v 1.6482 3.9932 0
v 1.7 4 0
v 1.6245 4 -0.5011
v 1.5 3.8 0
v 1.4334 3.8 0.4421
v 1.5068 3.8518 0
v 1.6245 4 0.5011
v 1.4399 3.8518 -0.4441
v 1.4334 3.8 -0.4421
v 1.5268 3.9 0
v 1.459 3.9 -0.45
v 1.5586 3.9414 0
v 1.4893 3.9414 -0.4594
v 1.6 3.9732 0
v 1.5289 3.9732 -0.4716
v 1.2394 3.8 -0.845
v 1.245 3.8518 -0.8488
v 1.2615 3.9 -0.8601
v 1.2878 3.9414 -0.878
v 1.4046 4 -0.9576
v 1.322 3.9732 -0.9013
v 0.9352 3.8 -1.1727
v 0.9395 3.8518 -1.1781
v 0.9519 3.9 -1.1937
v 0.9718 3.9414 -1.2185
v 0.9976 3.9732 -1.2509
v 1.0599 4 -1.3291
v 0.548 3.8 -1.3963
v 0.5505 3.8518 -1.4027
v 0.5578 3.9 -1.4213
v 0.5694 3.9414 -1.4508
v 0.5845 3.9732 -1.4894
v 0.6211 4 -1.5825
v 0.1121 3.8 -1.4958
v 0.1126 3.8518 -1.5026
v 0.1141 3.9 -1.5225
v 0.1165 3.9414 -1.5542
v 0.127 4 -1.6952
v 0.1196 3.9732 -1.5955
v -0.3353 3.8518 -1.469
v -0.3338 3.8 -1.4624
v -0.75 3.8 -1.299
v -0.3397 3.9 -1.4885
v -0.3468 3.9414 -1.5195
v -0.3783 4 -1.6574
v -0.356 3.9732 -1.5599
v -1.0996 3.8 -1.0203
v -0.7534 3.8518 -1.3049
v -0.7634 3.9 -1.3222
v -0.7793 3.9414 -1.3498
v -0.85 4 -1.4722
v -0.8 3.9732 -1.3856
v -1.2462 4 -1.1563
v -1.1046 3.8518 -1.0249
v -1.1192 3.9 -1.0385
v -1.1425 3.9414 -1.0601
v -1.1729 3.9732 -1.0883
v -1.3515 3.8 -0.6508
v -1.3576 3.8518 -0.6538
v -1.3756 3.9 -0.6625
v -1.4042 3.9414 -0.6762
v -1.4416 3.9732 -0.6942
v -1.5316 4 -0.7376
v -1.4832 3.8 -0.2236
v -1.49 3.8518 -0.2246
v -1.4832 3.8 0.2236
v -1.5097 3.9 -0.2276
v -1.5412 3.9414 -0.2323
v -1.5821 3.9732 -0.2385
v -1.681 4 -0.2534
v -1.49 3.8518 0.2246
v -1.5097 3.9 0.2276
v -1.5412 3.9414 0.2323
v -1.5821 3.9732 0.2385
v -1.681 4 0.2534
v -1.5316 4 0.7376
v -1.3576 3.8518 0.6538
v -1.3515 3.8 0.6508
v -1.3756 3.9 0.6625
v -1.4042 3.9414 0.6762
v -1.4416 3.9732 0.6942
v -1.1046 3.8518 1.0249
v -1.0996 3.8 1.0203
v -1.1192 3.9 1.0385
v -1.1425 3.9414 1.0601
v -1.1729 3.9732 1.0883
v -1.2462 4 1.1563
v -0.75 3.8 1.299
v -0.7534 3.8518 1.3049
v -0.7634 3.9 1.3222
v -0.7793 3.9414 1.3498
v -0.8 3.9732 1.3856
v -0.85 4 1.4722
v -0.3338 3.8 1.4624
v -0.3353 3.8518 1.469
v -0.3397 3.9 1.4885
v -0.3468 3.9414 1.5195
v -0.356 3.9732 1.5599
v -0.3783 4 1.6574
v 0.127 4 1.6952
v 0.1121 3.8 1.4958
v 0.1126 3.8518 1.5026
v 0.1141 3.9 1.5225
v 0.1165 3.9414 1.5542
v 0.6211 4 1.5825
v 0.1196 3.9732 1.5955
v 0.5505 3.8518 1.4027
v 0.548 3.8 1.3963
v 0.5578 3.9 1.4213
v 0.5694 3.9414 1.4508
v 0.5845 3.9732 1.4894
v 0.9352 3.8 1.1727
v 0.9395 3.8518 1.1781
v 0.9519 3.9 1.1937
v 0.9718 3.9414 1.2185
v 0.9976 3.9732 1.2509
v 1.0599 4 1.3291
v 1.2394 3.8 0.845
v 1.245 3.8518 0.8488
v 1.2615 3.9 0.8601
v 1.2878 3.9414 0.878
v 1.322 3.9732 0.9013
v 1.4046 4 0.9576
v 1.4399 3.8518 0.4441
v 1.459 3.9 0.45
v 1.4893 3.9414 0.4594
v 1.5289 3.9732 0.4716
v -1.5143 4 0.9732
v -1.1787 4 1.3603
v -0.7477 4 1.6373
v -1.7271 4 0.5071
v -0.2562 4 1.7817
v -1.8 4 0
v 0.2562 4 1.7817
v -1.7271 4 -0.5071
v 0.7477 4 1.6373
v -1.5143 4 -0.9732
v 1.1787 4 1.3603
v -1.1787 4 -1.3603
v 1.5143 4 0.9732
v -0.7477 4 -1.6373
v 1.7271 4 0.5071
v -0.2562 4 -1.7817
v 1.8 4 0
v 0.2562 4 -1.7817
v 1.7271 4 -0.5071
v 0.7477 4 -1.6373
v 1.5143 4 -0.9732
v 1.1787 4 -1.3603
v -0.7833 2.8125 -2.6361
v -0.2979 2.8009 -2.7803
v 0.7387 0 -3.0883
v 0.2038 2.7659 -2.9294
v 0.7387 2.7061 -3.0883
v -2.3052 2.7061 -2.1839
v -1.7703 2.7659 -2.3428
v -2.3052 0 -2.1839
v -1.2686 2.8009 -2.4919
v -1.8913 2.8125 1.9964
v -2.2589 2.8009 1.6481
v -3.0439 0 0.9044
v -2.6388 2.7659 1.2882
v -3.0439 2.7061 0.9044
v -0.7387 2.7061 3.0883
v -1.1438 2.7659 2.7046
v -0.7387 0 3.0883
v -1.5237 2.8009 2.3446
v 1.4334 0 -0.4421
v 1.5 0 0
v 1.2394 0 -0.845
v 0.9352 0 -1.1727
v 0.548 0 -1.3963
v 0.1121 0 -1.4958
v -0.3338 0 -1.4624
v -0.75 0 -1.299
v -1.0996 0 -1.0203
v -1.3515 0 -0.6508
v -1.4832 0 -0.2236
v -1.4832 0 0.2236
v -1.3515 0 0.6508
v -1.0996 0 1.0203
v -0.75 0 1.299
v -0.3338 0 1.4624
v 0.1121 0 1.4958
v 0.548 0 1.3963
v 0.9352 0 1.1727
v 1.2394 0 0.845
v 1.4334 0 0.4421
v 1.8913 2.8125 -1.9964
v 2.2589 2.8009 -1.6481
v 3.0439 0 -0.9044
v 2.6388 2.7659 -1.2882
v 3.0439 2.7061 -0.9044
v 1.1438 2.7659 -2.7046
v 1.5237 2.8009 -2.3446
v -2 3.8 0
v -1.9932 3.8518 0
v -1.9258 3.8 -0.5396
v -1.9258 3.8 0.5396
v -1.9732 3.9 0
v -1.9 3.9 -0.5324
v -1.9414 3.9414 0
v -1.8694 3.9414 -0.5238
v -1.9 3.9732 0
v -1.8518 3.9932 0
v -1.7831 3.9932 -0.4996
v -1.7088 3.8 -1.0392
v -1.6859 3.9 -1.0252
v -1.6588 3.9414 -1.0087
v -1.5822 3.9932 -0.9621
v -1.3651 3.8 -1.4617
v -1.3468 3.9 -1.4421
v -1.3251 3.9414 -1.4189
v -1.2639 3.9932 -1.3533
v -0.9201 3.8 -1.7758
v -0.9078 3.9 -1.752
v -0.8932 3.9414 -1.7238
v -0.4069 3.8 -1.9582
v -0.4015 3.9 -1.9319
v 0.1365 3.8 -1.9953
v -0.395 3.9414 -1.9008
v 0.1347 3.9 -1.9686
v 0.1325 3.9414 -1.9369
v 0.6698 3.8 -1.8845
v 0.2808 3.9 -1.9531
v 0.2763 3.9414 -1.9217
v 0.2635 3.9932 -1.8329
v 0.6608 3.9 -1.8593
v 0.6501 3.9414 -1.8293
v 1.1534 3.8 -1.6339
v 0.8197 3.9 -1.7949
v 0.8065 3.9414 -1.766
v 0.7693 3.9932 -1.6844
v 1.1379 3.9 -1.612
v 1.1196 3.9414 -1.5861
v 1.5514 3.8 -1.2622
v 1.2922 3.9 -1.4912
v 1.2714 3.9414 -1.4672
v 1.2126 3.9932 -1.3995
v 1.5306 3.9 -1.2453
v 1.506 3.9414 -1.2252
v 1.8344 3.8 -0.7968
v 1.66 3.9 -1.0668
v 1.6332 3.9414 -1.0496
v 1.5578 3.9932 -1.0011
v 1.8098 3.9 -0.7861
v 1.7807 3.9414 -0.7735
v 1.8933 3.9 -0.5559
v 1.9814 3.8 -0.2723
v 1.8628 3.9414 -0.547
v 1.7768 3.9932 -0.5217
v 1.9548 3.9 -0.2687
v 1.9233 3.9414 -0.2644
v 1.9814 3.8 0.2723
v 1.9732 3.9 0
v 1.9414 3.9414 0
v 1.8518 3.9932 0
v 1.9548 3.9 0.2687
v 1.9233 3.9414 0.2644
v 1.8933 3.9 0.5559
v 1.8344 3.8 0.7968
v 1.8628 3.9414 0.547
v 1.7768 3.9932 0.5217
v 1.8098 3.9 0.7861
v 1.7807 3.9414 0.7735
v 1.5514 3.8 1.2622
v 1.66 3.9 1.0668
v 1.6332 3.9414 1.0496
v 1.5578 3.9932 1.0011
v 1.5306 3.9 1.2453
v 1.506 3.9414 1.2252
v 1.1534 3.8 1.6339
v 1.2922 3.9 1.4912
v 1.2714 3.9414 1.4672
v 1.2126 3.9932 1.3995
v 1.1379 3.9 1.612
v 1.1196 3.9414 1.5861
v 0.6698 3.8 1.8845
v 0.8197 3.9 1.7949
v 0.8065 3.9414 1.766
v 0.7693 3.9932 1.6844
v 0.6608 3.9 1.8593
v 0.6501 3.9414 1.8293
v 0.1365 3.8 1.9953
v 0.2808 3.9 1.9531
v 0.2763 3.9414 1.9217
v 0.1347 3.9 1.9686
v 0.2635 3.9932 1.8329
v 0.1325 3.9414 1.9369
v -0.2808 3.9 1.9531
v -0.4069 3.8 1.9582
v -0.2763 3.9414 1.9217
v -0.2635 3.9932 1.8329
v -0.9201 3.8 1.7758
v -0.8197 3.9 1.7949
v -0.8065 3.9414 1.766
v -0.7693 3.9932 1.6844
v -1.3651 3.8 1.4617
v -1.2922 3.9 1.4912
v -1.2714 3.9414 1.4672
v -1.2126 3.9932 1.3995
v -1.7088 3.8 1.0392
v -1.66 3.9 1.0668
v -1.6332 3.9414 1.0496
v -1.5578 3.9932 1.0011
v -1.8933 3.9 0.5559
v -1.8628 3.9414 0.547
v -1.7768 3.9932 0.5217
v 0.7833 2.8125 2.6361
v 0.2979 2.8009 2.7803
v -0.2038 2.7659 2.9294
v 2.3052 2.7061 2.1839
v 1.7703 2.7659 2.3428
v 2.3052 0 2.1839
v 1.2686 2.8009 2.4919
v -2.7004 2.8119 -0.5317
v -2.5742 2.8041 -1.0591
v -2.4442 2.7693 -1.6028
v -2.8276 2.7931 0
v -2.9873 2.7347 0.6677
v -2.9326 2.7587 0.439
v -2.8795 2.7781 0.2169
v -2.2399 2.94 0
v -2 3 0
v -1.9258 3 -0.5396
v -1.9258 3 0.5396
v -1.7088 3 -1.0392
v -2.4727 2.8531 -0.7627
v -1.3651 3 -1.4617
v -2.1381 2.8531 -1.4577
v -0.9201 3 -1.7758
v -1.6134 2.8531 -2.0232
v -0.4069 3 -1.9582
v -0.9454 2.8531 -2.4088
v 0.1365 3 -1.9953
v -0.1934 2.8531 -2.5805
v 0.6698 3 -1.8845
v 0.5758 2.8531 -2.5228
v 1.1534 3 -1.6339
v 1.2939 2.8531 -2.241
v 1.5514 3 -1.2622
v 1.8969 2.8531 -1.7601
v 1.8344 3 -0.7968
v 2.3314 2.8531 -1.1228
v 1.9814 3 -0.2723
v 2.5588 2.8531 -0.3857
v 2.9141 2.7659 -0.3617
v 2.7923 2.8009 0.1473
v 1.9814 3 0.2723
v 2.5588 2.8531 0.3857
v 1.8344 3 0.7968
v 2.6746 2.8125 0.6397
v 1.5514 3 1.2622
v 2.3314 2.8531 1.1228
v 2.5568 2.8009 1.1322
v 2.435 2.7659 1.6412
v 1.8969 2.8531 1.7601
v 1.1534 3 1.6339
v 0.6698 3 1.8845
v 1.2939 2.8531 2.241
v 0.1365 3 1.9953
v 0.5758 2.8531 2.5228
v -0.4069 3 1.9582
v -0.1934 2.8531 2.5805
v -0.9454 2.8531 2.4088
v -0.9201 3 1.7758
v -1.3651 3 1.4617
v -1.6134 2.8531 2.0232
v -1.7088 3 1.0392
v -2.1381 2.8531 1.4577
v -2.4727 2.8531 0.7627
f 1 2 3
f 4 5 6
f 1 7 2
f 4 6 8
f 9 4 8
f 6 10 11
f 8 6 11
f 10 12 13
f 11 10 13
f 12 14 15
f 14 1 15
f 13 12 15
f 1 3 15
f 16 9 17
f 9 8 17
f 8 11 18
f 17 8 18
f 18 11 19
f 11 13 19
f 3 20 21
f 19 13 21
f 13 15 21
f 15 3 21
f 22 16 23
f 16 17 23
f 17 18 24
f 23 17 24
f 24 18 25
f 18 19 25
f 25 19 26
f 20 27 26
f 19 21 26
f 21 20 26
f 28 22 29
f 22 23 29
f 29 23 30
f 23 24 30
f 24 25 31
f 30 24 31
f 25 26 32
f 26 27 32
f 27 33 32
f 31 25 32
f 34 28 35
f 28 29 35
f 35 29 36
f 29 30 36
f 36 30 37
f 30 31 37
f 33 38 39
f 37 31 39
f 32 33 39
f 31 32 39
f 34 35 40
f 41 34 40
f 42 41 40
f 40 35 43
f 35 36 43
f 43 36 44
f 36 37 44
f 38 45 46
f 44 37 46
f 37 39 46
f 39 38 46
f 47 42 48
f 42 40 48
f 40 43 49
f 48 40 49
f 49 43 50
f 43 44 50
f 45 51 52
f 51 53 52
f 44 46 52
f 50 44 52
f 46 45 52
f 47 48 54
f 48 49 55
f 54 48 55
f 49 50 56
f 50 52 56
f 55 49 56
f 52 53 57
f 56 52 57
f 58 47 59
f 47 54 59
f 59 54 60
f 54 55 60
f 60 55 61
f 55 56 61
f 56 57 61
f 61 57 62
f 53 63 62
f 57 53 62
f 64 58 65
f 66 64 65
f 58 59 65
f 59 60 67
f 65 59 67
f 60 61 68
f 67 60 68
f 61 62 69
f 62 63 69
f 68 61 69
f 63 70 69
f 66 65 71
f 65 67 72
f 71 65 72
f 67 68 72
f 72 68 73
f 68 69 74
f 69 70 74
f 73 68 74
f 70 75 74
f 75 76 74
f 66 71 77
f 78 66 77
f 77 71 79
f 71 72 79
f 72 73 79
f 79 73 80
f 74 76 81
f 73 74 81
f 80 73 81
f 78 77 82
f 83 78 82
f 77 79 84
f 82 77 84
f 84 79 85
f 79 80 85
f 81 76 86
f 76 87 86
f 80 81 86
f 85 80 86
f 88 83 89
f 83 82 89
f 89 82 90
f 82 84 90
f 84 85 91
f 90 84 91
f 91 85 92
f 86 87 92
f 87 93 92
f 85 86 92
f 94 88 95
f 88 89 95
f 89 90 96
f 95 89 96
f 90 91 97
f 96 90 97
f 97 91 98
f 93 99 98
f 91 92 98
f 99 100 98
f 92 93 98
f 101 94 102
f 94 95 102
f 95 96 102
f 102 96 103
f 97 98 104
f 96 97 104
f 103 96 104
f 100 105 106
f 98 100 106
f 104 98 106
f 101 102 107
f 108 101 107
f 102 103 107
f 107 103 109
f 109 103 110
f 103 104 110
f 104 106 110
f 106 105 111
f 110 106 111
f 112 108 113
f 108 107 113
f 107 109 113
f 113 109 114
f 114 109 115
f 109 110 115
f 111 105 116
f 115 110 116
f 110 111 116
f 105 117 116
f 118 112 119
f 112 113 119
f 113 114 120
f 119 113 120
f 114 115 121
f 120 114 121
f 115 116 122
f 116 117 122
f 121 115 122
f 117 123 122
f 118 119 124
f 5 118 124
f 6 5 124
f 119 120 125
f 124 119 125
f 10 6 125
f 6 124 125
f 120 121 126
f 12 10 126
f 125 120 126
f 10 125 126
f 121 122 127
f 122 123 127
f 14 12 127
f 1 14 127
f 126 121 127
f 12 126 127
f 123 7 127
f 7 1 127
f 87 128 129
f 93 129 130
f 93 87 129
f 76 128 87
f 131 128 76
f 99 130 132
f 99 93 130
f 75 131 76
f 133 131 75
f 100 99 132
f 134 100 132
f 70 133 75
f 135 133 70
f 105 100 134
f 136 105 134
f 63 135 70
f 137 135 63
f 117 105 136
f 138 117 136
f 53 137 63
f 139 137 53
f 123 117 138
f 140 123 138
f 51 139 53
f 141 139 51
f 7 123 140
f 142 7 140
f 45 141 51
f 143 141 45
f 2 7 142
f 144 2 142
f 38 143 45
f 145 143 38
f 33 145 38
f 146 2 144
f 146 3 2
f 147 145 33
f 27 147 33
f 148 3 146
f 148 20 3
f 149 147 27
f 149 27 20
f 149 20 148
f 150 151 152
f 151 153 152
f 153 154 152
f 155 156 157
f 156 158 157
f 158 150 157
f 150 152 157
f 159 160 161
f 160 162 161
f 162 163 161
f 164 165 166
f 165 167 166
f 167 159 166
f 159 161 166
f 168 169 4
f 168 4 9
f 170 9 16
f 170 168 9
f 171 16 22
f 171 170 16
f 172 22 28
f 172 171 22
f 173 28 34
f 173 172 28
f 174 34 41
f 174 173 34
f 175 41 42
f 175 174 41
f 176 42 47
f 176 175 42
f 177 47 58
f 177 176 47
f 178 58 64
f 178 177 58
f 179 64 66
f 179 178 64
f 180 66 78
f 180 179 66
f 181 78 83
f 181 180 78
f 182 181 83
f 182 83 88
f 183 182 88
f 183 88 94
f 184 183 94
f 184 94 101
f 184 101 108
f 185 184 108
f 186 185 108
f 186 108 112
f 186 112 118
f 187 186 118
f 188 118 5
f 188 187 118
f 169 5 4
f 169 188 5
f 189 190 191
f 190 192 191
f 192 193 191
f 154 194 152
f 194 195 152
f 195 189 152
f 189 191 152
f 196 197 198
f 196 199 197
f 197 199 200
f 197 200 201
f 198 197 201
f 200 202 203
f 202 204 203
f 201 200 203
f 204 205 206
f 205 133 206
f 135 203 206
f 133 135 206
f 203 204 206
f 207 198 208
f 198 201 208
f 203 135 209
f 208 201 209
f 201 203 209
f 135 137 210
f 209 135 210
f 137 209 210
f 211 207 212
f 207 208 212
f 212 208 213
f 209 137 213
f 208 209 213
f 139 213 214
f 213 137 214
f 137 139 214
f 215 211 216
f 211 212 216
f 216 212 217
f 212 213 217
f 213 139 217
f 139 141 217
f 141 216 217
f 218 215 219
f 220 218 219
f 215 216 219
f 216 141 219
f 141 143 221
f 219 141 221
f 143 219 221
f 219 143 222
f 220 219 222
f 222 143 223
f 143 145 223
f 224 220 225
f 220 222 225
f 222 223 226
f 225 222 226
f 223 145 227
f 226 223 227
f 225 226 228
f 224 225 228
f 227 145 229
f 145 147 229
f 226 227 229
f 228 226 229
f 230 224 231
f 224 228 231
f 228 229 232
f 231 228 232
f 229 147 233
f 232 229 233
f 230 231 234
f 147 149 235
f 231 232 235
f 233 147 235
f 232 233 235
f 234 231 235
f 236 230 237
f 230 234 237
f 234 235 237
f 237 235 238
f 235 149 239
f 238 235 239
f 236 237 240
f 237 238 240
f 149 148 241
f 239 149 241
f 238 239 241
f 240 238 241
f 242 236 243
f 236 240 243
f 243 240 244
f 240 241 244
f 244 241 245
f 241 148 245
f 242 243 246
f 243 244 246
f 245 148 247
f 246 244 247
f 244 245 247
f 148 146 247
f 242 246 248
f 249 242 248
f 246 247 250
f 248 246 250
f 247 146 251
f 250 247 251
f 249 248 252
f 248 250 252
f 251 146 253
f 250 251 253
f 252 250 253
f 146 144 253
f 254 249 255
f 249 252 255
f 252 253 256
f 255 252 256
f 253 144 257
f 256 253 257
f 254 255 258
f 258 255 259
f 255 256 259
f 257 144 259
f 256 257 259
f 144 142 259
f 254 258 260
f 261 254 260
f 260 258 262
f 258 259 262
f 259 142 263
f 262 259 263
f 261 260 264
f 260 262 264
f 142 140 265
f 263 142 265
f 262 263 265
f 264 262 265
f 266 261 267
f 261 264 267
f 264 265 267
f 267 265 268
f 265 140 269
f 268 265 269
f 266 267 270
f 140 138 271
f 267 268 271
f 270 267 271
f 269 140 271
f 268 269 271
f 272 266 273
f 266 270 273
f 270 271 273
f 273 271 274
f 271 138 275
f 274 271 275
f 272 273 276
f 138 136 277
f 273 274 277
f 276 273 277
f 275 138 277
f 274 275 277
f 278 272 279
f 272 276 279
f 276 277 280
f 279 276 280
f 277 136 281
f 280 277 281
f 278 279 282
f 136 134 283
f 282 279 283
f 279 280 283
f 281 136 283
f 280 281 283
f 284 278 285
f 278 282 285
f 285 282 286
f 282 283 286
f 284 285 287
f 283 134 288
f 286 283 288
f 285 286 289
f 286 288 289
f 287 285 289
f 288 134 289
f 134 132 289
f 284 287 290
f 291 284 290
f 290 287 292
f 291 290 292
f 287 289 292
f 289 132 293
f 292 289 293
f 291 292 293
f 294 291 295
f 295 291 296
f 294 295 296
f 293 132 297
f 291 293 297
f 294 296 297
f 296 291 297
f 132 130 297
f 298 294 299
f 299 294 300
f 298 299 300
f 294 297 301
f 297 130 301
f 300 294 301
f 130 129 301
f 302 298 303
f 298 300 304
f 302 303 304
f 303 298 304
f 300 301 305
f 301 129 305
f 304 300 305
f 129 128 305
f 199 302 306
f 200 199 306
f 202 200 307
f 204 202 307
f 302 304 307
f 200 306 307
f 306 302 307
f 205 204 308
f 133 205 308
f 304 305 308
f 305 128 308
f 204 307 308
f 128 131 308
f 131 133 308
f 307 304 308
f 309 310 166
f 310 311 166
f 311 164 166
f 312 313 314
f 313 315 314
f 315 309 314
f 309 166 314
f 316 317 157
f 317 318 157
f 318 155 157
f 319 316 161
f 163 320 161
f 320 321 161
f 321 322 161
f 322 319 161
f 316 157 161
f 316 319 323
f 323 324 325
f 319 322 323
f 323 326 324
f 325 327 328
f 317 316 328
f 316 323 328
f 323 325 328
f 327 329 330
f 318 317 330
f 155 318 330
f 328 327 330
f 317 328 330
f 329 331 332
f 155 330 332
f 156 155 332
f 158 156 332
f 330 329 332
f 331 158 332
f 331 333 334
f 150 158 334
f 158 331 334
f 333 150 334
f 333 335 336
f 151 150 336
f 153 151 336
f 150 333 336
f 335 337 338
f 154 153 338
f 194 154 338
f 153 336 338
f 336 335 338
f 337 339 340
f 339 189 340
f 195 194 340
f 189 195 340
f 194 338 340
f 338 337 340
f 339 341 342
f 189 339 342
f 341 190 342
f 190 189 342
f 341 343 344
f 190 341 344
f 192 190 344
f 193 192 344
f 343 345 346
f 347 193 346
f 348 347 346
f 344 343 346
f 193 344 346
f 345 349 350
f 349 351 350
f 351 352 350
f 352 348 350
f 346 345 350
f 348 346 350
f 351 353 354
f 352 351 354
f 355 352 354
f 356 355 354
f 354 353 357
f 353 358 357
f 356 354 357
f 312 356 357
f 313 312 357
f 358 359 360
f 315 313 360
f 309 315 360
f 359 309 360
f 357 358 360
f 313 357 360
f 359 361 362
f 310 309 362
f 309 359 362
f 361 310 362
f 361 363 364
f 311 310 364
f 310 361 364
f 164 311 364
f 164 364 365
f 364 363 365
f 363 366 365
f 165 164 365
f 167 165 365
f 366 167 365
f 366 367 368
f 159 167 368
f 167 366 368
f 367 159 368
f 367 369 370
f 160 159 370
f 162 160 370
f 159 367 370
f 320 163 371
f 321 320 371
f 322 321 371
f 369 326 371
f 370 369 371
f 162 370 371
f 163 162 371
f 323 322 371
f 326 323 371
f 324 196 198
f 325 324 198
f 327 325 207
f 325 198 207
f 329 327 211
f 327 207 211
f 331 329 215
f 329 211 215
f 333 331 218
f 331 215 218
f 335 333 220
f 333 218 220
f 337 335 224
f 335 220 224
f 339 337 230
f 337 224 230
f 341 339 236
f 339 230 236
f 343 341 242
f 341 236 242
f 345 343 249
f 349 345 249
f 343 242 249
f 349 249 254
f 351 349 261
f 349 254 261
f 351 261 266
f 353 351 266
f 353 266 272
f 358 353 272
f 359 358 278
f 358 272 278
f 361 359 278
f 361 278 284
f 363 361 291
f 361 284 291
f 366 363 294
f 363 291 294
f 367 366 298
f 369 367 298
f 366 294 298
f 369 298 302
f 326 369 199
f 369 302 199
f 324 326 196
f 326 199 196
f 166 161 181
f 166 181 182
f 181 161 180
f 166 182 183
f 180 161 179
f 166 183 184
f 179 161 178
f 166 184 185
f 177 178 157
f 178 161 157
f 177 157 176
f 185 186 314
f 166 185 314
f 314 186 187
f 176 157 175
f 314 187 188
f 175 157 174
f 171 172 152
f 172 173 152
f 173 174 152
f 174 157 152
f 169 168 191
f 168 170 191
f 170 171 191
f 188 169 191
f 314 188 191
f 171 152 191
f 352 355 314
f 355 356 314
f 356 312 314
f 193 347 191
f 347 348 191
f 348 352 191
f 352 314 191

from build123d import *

# Parameters (mm, degrees)
SKETCH_1_R      = 1.5
EXTRUDE_1_DEPTH = 4
FILLET_2_R      = 0.2


with BuildPart() as part:
    # 草图1 → 凸台-拉伸1 (new body)
    with BuildSketch(Plane(origin=(0, 0, 0), x_dir=(1, 0, 0), z_dir=(0, 1, 0))):
        Polygon((2.305209376, -2.183882567), (3.04390247, 0.904428597), (0.738693094, 3.088311164), (-2.305209376, 2.183882567), (-3.04390247, -0.904428597), (-0.738693094, -3.088311164), align=None)
        Circle(SKETCH_1_R, mode=Mode.SUBTRACT)
    extrude(amount=EXTRUDE_1_DEPTH)

    # 草图2 → 切除-旋转1 (revolve, cut)
    with BuildSketch(Plane.XY):
        Polygon((-4, 2.5), (-2, 3), (-2, 4), (-4, 4), align=None)
    revolve(axis=Axis((0, 4, 0), (0, -1, 0)), mode=Mode.SUBTRACT)

    # 圆角2
    fillet_2_edges = [part.edges().sort_by_distance(p)[0] for p in [
        (-1.5, 4, 0),
        (2, 4, 0),
    ]]
    fillet(fillet_2_edges, radius=FILLET_2_R)


solid = part.part
